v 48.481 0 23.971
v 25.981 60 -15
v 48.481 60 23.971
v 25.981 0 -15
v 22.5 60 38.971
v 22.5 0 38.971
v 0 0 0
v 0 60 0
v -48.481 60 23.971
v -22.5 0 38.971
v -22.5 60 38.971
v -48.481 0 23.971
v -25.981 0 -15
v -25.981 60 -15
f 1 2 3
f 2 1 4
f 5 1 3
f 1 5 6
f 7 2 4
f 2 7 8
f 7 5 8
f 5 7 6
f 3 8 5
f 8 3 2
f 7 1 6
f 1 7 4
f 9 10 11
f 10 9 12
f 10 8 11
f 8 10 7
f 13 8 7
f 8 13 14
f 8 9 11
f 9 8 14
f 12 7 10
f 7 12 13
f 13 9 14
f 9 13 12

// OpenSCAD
// MIRRORING
// rotate cube

rotate([0, 30, 0])
    cube([30, 60, 45]);
    
// mirrowed across the yz - plane
mirror([1, 0, 0])
rotate([0, 30, 0])
    cube([30, 60, 45]);
